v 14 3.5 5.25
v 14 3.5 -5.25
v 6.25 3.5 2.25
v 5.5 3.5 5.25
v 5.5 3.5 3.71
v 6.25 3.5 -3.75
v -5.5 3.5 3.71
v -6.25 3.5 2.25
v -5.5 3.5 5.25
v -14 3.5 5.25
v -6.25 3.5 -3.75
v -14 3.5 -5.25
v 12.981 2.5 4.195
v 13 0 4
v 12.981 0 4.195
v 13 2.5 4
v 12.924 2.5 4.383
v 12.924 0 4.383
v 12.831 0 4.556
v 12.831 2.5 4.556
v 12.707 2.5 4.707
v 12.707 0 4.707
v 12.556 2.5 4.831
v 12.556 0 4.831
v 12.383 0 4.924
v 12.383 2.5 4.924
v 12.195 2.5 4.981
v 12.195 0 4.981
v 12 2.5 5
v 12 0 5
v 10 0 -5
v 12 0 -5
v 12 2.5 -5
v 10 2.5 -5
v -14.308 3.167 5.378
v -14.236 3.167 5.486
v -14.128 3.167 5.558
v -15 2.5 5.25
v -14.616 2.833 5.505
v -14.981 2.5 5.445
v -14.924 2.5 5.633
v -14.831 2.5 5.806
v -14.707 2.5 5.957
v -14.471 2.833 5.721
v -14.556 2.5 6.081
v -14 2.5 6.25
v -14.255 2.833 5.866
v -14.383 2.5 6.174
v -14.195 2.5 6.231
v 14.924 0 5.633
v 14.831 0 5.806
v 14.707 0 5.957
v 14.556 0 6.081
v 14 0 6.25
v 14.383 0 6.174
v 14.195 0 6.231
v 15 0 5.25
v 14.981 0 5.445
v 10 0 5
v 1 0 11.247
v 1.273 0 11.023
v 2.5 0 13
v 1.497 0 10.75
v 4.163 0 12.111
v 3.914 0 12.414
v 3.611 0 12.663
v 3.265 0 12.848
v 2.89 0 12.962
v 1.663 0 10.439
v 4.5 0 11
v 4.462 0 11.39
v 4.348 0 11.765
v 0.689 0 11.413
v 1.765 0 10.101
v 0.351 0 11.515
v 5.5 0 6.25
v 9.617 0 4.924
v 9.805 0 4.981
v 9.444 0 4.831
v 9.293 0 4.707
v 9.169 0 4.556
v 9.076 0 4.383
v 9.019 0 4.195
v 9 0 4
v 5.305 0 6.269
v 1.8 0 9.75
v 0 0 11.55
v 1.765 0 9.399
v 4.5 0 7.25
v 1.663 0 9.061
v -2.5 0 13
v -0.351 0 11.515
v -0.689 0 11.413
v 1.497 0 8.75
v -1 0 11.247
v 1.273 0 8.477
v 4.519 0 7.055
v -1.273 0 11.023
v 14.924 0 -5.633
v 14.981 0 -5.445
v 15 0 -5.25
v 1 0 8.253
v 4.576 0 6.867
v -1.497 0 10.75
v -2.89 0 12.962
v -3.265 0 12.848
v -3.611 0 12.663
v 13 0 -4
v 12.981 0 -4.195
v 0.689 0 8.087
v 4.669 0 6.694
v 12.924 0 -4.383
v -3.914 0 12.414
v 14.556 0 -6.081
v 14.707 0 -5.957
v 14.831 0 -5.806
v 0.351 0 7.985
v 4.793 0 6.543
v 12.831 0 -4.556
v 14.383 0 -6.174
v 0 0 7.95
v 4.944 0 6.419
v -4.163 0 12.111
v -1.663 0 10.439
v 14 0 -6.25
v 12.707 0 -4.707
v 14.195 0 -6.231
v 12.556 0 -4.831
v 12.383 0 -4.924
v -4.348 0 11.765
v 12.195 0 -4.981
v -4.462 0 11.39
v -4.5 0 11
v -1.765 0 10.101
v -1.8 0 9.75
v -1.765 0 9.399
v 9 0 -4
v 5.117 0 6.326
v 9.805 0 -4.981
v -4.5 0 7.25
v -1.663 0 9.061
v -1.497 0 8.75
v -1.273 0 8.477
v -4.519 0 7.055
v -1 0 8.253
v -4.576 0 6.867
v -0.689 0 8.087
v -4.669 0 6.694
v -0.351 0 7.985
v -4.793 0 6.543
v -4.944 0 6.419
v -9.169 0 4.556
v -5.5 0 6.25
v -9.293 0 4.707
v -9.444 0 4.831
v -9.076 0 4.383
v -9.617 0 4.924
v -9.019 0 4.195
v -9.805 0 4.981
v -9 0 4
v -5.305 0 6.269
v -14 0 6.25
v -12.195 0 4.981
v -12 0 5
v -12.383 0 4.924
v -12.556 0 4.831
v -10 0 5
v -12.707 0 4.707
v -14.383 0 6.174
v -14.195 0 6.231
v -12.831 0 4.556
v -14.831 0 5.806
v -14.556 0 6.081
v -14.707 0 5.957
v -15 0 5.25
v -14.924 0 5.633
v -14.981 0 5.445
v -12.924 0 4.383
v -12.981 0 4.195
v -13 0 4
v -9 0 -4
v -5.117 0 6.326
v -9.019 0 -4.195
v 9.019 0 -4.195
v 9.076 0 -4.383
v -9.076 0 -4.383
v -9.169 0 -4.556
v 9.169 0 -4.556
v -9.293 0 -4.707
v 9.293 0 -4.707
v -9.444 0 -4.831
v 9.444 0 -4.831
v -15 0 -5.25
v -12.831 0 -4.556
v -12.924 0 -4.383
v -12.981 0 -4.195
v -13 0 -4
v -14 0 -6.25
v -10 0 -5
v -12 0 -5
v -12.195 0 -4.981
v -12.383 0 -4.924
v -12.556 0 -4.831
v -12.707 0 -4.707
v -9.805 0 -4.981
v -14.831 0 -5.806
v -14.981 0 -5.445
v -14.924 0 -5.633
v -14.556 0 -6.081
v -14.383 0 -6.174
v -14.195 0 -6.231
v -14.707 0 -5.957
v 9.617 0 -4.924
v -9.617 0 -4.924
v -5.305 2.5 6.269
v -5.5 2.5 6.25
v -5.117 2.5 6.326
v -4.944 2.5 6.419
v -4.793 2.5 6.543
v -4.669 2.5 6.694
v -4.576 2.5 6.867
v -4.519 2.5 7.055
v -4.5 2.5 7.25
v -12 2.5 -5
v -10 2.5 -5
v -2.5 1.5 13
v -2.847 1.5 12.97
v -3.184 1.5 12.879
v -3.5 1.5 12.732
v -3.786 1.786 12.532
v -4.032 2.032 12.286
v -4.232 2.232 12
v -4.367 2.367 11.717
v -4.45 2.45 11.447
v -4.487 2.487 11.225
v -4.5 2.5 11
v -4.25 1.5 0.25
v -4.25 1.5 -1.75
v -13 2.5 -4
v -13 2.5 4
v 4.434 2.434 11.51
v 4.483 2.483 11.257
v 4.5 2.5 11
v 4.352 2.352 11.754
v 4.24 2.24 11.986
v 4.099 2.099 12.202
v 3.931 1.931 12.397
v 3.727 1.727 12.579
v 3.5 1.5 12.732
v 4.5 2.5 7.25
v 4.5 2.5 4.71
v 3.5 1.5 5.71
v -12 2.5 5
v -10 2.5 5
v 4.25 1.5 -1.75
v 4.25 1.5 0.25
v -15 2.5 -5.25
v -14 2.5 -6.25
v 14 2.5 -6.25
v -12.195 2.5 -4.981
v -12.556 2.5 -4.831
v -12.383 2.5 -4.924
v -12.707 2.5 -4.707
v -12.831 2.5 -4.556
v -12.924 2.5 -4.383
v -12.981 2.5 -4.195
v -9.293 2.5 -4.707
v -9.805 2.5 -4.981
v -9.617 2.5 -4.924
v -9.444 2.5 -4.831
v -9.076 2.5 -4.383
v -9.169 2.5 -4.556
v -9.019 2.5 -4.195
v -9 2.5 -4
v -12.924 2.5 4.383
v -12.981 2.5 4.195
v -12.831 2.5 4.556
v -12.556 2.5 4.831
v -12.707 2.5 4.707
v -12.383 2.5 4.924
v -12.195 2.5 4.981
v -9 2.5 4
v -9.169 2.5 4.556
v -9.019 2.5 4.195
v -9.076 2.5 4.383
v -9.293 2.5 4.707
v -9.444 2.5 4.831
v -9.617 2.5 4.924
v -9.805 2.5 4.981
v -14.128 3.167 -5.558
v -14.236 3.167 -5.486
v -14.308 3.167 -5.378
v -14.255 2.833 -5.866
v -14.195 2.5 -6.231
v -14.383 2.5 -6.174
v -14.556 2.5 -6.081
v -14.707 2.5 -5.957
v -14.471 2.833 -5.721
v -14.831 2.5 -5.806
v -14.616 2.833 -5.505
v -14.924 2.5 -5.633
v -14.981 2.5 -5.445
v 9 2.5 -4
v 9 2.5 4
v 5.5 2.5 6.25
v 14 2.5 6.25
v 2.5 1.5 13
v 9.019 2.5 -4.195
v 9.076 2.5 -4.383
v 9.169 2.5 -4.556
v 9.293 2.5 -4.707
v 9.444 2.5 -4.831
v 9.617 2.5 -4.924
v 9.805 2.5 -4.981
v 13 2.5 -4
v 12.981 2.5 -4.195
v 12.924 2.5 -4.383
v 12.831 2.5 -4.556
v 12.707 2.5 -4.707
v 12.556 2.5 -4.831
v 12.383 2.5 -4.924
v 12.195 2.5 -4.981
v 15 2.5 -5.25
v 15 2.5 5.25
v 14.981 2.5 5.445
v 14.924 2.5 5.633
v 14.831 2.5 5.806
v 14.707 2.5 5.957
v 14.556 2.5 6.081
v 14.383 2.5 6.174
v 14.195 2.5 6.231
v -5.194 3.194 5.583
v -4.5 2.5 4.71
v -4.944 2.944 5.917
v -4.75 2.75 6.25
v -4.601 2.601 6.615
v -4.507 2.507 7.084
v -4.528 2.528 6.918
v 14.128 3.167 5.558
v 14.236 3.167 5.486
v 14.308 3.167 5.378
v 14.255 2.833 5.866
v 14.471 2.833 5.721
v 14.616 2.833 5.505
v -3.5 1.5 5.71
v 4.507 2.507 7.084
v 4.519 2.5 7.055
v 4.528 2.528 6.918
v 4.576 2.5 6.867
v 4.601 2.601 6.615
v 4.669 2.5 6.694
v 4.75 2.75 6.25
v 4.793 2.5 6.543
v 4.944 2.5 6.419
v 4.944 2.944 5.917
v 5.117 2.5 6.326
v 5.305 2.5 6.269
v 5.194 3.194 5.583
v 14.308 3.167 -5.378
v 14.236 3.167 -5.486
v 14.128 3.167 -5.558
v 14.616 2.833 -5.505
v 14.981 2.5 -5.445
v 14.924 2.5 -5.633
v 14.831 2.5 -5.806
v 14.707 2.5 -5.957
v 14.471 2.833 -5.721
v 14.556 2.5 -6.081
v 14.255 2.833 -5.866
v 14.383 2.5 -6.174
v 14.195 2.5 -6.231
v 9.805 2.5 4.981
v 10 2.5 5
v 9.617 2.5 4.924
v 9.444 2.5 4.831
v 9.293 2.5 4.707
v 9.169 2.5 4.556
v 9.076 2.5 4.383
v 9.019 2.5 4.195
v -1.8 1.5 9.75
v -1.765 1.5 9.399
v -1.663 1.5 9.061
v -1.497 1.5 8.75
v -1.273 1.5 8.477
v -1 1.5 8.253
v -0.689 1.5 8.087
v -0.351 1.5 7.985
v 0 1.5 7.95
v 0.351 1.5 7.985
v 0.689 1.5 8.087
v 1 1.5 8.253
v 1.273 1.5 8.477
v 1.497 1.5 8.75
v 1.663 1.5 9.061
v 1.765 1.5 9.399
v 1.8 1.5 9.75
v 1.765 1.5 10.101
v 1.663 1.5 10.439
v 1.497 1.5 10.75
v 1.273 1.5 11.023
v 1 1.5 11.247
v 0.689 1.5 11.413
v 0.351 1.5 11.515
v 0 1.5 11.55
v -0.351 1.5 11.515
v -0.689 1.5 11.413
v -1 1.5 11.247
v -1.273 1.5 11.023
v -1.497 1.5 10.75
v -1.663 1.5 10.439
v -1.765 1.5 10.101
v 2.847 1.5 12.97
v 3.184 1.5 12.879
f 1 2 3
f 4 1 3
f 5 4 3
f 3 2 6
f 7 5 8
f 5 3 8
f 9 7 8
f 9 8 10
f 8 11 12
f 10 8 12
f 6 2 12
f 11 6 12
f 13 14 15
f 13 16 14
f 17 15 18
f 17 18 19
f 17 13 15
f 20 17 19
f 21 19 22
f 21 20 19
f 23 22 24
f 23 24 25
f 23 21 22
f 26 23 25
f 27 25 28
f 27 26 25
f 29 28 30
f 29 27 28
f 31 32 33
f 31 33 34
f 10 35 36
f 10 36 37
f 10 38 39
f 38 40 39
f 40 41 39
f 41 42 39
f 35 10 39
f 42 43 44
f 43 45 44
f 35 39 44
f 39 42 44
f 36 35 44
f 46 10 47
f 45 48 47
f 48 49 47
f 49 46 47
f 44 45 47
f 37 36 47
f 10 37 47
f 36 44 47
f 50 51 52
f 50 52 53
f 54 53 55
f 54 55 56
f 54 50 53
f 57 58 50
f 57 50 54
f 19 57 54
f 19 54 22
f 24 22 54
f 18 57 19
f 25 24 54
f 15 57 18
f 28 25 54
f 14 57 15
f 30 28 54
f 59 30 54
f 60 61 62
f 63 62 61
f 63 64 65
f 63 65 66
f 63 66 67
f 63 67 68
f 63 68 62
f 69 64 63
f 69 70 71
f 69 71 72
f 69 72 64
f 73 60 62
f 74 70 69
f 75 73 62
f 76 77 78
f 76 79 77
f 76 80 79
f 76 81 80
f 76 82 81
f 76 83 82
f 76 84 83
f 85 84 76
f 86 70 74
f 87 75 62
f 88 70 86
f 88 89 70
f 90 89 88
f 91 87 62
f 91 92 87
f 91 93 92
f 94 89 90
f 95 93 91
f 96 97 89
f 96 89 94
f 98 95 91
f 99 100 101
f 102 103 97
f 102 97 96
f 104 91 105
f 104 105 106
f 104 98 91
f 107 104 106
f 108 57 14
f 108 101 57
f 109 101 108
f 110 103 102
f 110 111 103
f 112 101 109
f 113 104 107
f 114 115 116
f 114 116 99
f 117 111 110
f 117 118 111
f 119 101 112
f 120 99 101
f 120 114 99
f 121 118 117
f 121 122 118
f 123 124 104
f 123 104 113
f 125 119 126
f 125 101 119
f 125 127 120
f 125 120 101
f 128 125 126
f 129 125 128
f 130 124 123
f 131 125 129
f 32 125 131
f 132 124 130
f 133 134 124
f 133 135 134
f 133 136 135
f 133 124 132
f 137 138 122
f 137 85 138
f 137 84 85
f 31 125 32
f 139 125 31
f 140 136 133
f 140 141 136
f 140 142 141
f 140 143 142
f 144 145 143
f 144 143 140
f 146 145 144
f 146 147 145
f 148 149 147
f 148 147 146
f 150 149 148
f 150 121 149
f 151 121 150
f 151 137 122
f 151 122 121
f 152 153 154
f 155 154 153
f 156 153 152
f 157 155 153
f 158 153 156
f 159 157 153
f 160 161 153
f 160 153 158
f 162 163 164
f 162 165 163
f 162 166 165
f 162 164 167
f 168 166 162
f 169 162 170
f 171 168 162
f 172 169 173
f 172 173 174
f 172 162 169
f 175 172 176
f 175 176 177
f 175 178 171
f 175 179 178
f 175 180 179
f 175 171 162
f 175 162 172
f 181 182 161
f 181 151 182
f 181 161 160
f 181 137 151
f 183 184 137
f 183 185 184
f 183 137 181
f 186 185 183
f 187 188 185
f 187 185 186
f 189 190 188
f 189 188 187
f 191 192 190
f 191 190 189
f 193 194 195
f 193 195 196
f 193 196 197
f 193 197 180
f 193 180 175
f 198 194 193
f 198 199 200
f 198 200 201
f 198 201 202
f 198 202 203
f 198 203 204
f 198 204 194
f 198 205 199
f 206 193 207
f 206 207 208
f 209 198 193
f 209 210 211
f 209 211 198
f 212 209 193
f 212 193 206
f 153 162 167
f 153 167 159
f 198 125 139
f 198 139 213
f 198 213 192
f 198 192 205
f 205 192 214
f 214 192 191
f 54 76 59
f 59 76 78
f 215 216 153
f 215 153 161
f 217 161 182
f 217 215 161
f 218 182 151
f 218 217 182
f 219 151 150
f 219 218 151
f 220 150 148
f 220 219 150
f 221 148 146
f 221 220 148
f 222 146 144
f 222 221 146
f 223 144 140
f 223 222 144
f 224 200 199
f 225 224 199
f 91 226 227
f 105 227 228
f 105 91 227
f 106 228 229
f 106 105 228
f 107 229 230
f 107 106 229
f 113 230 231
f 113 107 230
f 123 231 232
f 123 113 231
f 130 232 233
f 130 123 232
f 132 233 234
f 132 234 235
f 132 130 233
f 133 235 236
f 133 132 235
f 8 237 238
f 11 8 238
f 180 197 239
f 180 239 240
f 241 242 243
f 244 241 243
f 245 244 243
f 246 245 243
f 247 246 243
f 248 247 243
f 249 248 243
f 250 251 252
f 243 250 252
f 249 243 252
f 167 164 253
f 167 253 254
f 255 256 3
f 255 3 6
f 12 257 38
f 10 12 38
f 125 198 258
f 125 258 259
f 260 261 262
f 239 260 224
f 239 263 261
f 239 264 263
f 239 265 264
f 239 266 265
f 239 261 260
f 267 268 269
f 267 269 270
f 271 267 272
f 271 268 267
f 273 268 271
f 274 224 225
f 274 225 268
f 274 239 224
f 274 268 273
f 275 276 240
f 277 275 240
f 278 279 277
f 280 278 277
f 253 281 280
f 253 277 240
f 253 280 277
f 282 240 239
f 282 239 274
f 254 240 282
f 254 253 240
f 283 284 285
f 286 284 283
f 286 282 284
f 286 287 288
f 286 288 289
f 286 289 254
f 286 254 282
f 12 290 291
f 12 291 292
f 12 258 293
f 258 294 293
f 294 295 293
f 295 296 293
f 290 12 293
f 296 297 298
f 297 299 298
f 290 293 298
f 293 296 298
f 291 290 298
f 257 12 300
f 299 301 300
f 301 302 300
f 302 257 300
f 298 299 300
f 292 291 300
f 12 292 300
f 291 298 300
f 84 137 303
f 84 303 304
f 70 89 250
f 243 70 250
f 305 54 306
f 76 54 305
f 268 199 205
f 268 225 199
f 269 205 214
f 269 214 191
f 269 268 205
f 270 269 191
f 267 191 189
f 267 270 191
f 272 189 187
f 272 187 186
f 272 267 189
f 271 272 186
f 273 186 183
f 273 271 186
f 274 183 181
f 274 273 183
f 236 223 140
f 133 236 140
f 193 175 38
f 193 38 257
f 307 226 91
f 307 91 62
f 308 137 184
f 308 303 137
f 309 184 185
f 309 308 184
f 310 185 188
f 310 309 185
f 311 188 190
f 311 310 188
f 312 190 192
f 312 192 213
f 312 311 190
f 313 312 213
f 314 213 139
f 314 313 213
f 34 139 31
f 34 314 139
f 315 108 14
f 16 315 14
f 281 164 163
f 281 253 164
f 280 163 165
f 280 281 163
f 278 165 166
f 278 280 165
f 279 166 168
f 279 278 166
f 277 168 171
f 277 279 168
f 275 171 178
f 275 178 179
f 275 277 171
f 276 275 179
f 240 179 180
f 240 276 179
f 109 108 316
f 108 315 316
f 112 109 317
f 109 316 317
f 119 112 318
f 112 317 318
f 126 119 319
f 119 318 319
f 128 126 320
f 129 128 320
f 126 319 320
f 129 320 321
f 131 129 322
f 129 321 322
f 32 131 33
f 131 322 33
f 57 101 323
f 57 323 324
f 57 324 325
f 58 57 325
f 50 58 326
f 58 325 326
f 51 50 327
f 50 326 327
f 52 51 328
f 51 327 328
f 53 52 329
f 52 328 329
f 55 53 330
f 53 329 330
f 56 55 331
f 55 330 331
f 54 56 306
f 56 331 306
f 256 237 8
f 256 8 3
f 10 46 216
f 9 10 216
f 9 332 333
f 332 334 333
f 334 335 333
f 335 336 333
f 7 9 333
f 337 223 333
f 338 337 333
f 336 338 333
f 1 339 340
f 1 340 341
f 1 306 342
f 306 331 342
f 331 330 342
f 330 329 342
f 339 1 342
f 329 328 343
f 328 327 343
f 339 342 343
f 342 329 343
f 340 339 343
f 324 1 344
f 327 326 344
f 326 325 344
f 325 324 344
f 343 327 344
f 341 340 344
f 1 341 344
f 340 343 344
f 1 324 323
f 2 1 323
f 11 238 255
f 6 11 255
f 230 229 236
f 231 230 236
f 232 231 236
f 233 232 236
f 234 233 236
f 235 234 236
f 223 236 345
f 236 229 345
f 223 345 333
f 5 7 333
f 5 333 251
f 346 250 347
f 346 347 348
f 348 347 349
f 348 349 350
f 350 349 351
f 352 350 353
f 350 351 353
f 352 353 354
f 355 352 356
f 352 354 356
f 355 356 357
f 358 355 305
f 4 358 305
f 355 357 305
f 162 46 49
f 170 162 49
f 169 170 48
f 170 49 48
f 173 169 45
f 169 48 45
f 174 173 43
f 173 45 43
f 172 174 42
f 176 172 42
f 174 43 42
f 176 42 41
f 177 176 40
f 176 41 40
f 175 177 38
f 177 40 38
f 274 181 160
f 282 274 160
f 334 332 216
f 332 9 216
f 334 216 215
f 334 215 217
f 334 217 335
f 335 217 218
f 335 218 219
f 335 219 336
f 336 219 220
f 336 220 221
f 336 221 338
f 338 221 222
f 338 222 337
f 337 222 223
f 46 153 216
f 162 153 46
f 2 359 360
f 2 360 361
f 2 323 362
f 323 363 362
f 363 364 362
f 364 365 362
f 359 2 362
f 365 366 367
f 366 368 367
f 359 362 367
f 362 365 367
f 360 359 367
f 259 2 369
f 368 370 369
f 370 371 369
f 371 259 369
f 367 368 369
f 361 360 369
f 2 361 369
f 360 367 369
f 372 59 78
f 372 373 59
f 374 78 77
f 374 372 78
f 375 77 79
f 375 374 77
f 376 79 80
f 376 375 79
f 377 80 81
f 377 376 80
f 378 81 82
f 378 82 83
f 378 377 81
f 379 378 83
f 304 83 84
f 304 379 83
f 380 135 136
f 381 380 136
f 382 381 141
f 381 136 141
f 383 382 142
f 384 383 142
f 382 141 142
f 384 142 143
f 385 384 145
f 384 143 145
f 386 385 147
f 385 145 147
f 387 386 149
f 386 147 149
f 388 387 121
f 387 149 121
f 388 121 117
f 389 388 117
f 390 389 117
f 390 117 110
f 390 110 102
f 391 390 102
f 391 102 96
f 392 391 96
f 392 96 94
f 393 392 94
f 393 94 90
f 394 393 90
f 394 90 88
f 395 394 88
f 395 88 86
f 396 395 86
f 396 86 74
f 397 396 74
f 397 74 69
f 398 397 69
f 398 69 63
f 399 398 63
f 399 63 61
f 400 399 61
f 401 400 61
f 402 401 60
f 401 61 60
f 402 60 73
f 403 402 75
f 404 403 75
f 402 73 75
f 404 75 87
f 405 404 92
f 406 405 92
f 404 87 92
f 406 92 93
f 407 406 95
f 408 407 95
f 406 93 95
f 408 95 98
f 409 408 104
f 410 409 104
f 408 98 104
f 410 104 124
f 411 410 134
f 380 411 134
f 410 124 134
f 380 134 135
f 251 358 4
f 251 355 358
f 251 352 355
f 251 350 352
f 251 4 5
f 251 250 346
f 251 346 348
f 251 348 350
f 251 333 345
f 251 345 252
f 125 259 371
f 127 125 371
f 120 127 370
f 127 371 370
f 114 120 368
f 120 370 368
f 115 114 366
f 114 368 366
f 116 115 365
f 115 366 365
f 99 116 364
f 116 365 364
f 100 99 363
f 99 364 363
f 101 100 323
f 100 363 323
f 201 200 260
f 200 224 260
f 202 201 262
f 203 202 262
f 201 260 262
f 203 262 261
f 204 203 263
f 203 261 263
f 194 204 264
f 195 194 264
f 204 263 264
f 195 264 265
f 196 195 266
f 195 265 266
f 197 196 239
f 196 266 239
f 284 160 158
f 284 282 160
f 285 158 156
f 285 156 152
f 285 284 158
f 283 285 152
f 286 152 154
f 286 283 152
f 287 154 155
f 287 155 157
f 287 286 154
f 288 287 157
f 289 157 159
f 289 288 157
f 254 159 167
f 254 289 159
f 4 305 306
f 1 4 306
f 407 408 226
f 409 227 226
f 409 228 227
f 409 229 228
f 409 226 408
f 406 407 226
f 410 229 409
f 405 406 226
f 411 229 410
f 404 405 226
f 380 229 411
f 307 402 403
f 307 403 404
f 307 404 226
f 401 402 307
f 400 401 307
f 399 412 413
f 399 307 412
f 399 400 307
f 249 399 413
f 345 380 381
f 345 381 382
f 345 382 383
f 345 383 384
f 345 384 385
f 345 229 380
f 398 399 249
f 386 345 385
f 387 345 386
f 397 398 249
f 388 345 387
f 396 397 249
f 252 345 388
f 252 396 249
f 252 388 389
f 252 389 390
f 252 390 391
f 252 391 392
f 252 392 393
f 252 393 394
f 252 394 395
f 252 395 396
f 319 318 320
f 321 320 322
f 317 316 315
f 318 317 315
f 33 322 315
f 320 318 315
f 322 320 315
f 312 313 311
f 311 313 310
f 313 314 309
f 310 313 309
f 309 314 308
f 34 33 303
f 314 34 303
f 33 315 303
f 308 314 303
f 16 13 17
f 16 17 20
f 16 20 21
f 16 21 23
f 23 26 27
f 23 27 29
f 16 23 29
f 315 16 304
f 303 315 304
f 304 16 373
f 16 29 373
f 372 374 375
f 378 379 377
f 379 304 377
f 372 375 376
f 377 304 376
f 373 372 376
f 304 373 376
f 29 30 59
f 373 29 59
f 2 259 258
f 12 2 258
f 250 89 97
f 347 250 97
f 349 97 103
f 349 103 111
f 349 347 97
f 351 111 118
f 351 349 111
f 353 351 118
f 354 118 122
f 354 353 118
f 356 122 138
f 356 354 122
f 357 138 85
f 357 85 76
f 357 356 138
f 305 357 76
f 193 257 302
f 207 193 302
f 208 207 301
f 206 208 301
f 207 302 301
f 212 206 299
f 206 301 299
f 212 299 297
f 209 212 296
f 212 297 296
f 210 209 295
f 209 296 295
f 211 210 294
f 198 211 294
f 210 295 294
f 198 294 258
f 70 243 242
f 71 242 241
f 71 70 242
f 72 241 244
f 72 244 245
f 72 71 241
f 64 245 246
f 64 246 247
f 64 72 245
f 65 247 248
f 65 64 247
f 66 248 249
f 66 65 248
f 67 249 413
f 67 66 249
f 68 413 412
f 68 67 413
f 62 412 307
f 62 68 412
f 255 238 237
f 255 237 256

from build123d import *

# Parameters (mm, degrees)
BOSS_EXTRUDE1_DEPTH  = 3.5
SKETCH2_W            = 4
SKETCH2_H            = 10
CUT_EXTRUDE1_DEPTH   = 2.5
FILLET1_R            = 1
FILLET2_R            = 1
FILLET2_OF_MIRROR1_R = 1
SKETCH3_W            = 9
SKETCH3_H            = 8.290227197
CUT_EXTRUDE3_DEPTH   = 2
CHAMFER2_START       = 4.709772803
CHAMFER2_DEPTH       = 8.290227197
CHAMFER2_START_2     = 3
CHAMFER2_2_DEPTH     = 2.09807924
CHAMFER3_SIZE        = 1
M3_CLEARANCE_HOLE2_D = 3.6
FILLET4_R            = 2
SKETCH13_W           = 12.5
SKETCH13_H           = 6
CUT_EXTRUDE4_DEPTH   = 2
CHAMFER4_SIZE        = 2


with BuildPart() as part:
    # Sketch1 → Boss-Extrude1 (new body)
    with BuildSketch(Plane(origin=(0, 0, 0), x_dir=(1, 0, 0), z_dir=(0, 1, 0))):
        Polygon((-4.5, -6.25), (-15, -6.25), (-15, 6.25), (15, 6.25), (15, -6.25), (4.5, -6.25), (4.5, -13), (-4.5, -13), align=None)
    extrude(amount=BOSS_EXTRUDE1_DEPTH)

    # Sketch2 → Cut-Extrude1 (cut)
    with BuildSketch(Plane.XZ):
        with Locations((-11, 0)):
            Rectangle(SKETCH2_W, SKETCH2_H)
    cut_extrude1 = extrude(amount=-CUT_EXTRUDE1_DEPTH, mode=Mode.SUBTRACT)

    # Fillet1
    fillet1_edges = [part.edges().sort_by_distance(p)[0] for p in [
        (-15, 1.75, -6.25),
        (15, 1.75, -6.25),
        (15, 1.75, 6.25),
        (4.5, 1.75, 6.25),
        (-4.5, 1.75, 6.25),
        (-15, 1.75, 6.25),
    ]]
    fillet(fillet1_edges, radius=FILLET1_R)

    # Fillet2
    fillet2_edges = [part.edges().sort_by_distance(p)[0] for p in [
        (-9, 1.25, 5),
        (-9, 1.25, -5),
        (-13, 1.25, -5),
        (-13, 1.25, 5),
    ]]
    fillet(fillet2_edges, radius=FILLET2_R)

    # Mirror1: Cut-Extrude1 across plane
    add(cut_extrude1.mirror(Plane(origin=(0, 0, 0), x_dir=(0, 0, 1), z_dir=(1, 0, 0))), mode=Mode.SUBTRACT)

    # Fillet2 of Mirror1
    fillet2_of_mirror1_edges = [part.edges().sort_by_distance(p)[0] for p in [
        (9, 1.25, 5),
        (9, 1.25, -5),
        (13, 1.25, -5),
        (13, 1.25, 5),
    ]]
    fillet(fillet2_of_mirror1_edges, radius=FILLET2_OF_MIRROR1_R)

    # Sketch3 → Cut-Extrude3 (cut)
    with BuildSketch(Plane(origin=(0, 3.5, 0), x_dir=(1, 0, 0), z_dir=(0, 1, 0))):
        with Locations((0, -8.854886401)):
            Rectangle(SKETCH3_W, SKETCH3_H)
    extrude(amount=-CUT_EXTRUDE3_DEPTH, mode=Mode.SUBTRACT)

    # Chamfer2: read off the stored shape, not the designer's step
    # Chamfer2 outline → Chamfer2 (add)
    with BuildSketch(Plane.XY.offset(CHAMFER2_START)):
        Polygon((4.5, 2.5), (3.5, 1.5), (4.5, 1.5), align=None)
        Polygon((-4.5, 2.5), (-4.5, 1.5), (-3.5, 1.5), align=None)
    extrude(amount=CHAMFER2_DEPTH)

    # Chamfer2 2 outline → Chamfer2 2 (add)
    with BuildSketch(Plane(origin=(0, 0, 0), x_dir=(1, 0, 0), z_dir=(0, 0.70710678118655, 0.707106781186545)).offset(CHAMFER2_START_2)):
        Polygon((4.5, -1.562545334), (-4.5, -1.562545334), (-3.5, -2.976758896), (3.5, -2.976758896), align=None)
    extrude(amount=CHAMFER2_2_DEPTH)

    # Chamfer3
    chamfer3_edges = [part.edges().sort_by_distance(p)[0] for p in [
        (-4.792893219, 3.5, 6.542893219),
        (-9.75, 3.5, 6.25),
        (-14.707106781, 3.5, 5.957106781),
        (-15, 3.5, 0),
        (-14.707106781, 3.5, -5.957106781),
        (0, 3.5, -6.25),
        (14.707106781, 3.5, -5.957106781),
        (15, 3.5, 0),
        (14.707106781, 3.5, 5.957106781),
        (9.75, 3.5, 6.25),
        (4.792893219, 3.5, 6.542893219),
        (4.5, 3.5, 5.979886401),
        (0, 3.5, 4.709772803),
        (-4.5, 3.5, 5.979886401),
    ]]
    chamfer(chamfer3_edges, length=CHAMFER3_SIZE - 0.0001)  # a hair under: the kernel refuses the full size

    # M3 Clearance Hole2 (through all)
    with Locations(Plane(origin=(0, 1.5, 0), x_dir=(1, 0, 0), z_dir=(0, 1, 0))):
        with Locations((0, -9.75)):
            Hole(M3_CLEARANCE_HOLE2_D / 2)

    # Fillet4
    fillet4_edges = [part.edges().sort_by_distance(p)[0] for p in [
        (4.5, 1.25, 13),
        (-4.5, 1.25, 13),
    ]]
    fillet(fillet4_edges, radius=FILLET4_R)

    # Sketch13 → Cut-Extrude4 (cut)
    with BuildSketch(Plane(origin=(0, 3.5, 0), x_dir=(1, 0, 0), z_dir=(0, 1, 0))):
        with Locations((0, 0.75)):
            Rectangle(SKETCH13_W, SKETCH13_H)
    extrude(amount=-CUT_EXTRUDE4_DEPTH, mode=Mode.SUBTRACT)

    # Chamfer4
    chamfer4_edges = [part.edges().sort_by_distance(p)[0] for p in [
        (0, 1.5, -3.75),
        (6.25, 1.5, -0.75),
        (0, 1.5, 2.25),
        (-6.25, 1.5, -0.75),
    ]]
    chamfer(chamfer4_edges, length=CHAMFER4_SIZE - 0.0001)  # a hair under: the kernel refuses the full size


solid = part.part
